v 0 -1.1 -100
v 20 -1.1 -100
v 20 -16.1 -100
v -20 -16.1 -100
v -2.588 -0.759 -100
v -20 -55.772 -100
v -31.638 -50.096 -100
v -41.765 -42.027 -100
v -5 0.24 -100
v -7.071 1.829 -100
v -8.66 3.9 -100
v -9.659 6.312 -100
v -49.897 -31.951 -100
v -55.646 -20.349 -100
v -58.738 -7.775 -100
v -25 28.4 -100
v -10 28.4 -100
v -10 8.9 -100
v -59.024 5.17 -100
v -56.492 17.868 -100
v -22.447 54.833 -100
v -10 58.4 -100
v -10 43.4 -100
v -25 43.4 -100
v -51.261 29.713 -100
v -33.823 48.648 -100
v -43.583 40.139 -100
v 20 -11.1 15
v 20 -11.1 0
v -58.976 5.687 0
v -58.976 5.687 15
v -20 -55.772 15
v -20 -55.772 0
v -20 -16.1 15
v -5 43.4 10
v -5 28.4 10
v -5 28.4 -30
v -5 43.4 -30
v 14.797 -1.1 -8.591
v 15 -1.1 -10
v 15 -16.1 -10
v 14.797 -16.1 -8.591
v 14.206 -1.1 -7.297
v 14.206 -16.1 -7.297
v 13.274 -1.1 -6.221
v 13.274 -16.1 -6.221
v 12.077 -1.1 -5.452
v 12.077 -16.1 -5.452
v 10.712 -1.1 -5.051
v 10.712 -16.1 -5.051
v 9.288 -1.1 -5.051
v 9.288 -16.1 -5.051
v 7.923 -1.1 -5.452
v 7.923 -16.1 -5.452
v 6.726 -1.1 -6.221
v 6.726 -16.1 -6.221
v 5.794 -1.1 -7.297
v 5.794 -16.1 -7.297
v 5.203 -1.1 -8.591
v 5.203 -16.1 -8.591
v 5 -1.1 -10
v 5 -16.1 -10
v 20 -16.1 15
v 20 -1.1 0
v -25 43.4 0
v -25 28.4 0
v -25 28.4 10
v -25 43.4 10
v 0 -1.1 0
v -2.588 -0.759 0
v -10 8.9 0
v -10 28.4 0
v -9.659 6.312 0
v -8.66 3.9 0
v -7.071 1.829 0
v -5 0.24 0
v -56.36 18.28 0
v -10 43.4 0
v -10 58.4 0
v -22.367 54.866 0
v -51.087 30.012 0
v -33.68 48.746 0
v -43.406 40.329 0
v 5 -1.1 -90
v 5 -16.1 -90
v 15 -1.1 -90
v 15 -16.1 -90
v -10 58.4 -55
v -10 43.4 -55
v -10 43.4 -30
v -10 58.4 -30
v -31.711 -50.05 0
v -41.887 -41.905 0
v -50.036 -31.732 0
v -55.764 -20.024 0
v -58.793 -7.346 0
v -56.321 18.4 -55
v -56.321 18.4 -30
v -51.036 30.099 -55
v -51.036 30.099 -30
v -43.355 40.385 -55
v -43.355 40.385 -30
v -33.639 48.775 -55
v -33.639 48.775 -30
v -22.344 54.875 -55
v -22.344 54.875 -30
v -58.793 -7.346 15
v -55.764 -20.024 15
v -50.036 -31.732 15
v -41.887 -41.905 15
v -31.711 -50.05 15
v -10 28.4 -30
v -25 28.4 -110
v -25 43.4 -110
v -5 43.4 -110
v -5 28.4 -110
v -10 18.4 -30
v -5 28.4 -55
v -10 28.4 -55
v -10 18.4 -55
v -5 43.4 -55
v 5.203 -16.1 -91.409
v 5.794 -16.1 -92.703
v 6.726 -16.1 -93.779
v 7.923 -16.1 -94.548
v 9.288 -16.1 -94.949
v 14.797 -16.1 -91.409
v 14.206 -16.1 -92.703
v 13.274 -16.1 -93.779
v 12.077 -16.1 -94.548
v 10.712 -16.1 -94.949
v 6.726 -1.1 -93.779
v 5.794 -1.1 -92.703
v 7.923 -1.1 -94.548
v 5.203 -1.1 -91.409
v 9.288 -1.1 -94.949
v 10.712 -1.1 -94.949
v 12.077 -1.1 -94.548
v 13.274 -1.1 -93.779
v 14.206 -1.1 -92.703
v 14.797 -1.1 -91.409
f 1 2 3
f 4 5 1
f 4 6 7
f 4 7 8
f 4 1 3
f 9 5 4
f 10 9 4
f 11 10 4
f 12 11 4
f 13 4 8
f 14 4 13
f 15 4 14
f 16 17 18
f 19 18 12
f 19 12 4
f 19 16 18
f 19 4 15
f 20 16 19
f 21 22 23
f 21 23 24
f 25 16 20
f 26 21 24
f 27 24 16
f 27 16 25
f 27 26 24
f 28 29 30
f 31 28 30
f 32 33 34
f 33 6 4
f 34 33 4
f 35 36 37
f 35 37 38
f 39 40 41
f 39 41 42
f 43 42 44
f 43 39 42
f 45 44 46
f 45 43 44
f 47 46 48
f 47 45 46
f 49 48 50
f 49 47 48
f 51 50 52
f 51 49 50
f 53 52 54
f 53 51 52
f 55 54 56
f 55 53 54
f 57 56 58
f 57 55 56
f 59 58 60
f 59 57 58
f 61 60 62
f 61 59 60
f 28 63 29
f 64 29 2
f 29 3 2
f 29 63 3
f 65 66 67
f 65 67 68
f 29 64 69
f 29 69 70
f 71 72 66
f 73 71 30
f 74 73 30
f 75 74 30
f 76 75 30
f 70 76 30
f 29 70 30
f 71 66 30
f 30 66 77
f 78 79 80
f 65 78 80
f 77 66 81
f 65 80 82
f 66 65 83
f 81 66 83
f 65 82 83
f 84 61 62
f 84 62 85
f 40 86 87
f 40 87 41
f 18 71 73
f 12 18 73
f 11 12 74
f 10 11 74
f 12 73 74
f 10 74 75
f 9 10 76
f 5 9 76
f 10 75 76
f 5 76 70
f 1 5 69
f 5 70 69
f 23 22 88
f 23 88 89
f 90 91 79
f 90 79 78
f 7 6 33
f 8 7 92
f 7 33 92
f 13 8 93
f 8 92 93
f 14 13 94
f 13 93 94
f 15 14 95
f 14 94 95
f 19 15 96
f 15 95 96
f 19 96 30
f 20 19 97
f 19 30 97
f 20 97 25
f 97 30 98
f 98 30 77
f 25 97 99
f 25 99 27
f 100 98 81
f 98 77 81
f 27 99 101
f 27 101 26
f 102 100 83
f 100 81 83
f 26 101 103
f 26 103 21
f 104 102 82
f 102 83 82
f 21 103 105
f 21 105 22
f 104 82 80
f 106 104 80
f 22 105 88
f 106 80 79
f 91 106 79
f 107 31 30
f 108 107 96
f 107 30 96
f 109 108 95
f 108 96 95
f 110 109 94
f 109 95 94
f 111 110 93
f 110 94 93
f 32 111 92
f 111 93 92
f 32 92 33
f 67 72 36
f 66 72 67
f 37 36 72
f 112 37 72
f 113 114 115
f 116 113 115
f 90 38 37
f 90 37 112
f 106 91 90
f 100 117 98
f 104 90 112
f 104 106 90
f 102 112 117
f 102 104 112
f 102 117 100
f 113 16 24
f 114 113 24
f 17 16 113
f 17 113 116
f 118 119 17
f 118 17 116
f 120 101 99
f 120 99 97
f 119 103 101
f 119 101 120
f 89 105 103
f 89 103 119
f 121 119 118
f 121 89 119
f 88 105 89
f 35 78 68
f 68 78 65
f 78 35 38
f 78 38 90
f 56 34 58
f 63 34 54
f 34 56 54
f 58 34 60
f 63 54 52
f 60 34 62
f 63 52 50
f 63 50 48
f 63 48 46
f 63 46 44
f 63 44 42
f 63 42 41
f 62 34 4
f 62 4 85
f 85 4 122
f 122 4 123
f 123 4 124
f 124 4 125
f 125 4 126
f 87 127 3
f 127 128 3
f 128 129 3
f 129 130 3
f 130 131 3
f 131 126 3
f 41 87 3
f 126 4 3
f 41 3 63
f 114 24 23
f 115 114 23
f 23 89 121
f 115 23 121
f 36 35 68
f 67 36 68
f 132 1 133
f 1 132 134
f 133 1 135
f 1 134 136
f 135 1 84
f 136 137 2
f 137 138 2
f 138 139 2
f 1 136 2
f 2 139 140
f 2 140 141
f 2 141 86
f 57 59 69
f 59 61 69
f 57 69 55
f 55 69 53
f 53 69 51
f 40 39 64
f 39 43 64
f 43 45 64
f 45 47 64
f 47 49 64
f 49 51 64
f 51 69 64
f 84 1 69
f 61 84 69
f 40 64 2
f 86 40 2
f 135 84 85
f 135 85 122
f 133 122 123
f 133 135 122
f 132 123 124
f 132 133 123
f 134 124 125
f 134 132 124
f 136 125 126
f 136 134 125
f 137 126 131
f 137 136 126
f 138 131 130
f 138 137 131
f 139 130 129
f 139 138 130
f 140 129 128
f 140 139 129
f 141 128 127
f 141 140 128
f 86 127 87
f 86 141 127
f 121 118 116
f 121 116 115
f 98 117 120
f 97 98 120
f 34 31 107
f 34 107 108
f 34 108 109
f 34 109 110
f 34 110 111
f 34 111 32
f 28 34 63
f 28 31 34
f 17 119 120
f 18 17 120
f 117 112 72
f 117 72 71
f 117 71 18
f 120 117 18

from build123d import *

# Parameters (mm, degrees)
BOSS_EXTRUDE1_DEPTH     = 100
BOSS_EXTRUDE2_DEPTH     = 15
SKETCH3_W               = 25
SKETCH3_H               = 40
CUT_EXTRUDE1_DEPTH      = 21
CUT_EXTRUDE1_DEPTH_BACK = 60.25
SKETCH4_W               = 20
SKETCH4_H               = 15
BOSS_EXTRUDE3_DEPTH     = 55
SKETCH5_W               = 20
SKETCH5_H               = 15
BOSS_EXTRUDE4_DEPTH     = 40
CUT_EXTRUDE2_DEPTH      = 60.5
CUT_EXTRUDE2_DEPTH_BACK = 55.672438422


with BuildPart() as part:
    # Sketch1 → Boss-Extrude1 (new body)
    with BuildSketch(Plane.XY):
        with BuildLine():
            Line((-10, 58.400021404), (-10, 43.400021404))
            Line((-10, 43.400021404), (-25, 43.400021404))
            Line((-25, 43.400021404), (-25, 28.400021404))
            Line((-25, 28.400021404), (-10, 28.400021404))
            Line((-10, 28.400021404), (-10, 8.900021404))
            ThreePointArc((-10, 8.900021404), (-7.071067812, 1.828953592), (0, -1.099978596))
            Line((0, -1.099978596), (20, -1.099978596))
            Line((20, -1.099978596), (20, -16.099978596))
            Line((20, -16.099978596), (-20, -16.099978596))
            Line((-20, -16.099978596), (-20, -55.772417018))
            ThreePointArc((-20, -55.772417018), (-59.024032595, 5.169726898), (-10, 58.400021404))
        make_face()
    extrude(amount=-BOSS_EXTRUDE1_DEPTH)

    # Sketch2 → Boss-Extrude2 (add)
    with BuildSketch(Plane.XY):
        with BuildLine():
            Line((20, -11.099978596), (-58.976442171, 5.686982405))
            ThreePointArc((-58.976442171, 5.686982405), (-50.036327292, -31.732135938), (-20, -55.772417018))
            Line((-20, -55.772417018), (-20, -16.099978596))
            Line((-20, -16.099978596), (20, -16.099978596))
            Line((20, -16.099978596), (20, -11.099978596))
        make_face()
    extrude(amount=BOSS_EXTRUDE2_DEPTH)

    # Sketch3 → Cut-Extrude1 (cut, two sides)
    with BuildSketch(Plane(origin=(0, 0, 0), x_dir=(0, 0, -1), z_dir=(1, 0, 0))) as cut_extrude1_sk:
        with Locations((42.5, 38.400021404)):
            Rectangle(SKETCH3_W, SKETCH3_H)
    extrude(amount=CUT_EXTRUDE1_DEPTH, mode=Mode.SUBTRACT)
    extrude(cut_extrude1_sk.sketch, amount=-CUT_EXTRUDE1_DEPTH_BACK, mode=Mode.SUBTRACT)

    # Sketch4 → Boss-Extrude3 (add)
    with BuildSketch(Plane.XY.offset(-55)):
        with Locations((-15, 35.900021404)):
            Rectangle(SKETCH4_W, SKETCH4_H)
    extrude(amount=-BOSS_EXTRUDE3_DEPTH)

    # Sketch5 → Boss-Extrude4 (add)
    with BuildSketch(Plane(origin=(0, 0, -30), x_dir=(-1, 0, 0), z_dir=(0, 0, -1))):
        with Locations((15, 35.900021404)):
            Rectangle(SKETCH5_W, SKETCH5_H)
    extrude(amount=-BOSS_EXTRUDE4_DEPTH)

    # Sketch6 → Cut-Extrude2 (cut, two sides)
    with BuildSketch(Plane(origin=(0, -1.099978596, 0), x_dir=(1, 0, 0), z_dir=(0, 1, 0))) as cut_extrude2_sk:
        with BuildLine():
            Line((15, 90), (15, 10))
            ThreePointArc((15, 10), (10, 5), (5, 10))
            Line((5, 10), (5, 90))
            ThreePointArc((5, 90), (10, 95), (15, 90))
        make_face()
    extrude(amount=CUT_EXTRUDE2_DEPTH, mode=Mode.SUBTRACT)
    extrude(cut_extrude2_sk.sketch, amount=-CUT_EXTRUDE2_DEPTH_BACK, mode=Mode.SUBTRACT)


solid = part.part
